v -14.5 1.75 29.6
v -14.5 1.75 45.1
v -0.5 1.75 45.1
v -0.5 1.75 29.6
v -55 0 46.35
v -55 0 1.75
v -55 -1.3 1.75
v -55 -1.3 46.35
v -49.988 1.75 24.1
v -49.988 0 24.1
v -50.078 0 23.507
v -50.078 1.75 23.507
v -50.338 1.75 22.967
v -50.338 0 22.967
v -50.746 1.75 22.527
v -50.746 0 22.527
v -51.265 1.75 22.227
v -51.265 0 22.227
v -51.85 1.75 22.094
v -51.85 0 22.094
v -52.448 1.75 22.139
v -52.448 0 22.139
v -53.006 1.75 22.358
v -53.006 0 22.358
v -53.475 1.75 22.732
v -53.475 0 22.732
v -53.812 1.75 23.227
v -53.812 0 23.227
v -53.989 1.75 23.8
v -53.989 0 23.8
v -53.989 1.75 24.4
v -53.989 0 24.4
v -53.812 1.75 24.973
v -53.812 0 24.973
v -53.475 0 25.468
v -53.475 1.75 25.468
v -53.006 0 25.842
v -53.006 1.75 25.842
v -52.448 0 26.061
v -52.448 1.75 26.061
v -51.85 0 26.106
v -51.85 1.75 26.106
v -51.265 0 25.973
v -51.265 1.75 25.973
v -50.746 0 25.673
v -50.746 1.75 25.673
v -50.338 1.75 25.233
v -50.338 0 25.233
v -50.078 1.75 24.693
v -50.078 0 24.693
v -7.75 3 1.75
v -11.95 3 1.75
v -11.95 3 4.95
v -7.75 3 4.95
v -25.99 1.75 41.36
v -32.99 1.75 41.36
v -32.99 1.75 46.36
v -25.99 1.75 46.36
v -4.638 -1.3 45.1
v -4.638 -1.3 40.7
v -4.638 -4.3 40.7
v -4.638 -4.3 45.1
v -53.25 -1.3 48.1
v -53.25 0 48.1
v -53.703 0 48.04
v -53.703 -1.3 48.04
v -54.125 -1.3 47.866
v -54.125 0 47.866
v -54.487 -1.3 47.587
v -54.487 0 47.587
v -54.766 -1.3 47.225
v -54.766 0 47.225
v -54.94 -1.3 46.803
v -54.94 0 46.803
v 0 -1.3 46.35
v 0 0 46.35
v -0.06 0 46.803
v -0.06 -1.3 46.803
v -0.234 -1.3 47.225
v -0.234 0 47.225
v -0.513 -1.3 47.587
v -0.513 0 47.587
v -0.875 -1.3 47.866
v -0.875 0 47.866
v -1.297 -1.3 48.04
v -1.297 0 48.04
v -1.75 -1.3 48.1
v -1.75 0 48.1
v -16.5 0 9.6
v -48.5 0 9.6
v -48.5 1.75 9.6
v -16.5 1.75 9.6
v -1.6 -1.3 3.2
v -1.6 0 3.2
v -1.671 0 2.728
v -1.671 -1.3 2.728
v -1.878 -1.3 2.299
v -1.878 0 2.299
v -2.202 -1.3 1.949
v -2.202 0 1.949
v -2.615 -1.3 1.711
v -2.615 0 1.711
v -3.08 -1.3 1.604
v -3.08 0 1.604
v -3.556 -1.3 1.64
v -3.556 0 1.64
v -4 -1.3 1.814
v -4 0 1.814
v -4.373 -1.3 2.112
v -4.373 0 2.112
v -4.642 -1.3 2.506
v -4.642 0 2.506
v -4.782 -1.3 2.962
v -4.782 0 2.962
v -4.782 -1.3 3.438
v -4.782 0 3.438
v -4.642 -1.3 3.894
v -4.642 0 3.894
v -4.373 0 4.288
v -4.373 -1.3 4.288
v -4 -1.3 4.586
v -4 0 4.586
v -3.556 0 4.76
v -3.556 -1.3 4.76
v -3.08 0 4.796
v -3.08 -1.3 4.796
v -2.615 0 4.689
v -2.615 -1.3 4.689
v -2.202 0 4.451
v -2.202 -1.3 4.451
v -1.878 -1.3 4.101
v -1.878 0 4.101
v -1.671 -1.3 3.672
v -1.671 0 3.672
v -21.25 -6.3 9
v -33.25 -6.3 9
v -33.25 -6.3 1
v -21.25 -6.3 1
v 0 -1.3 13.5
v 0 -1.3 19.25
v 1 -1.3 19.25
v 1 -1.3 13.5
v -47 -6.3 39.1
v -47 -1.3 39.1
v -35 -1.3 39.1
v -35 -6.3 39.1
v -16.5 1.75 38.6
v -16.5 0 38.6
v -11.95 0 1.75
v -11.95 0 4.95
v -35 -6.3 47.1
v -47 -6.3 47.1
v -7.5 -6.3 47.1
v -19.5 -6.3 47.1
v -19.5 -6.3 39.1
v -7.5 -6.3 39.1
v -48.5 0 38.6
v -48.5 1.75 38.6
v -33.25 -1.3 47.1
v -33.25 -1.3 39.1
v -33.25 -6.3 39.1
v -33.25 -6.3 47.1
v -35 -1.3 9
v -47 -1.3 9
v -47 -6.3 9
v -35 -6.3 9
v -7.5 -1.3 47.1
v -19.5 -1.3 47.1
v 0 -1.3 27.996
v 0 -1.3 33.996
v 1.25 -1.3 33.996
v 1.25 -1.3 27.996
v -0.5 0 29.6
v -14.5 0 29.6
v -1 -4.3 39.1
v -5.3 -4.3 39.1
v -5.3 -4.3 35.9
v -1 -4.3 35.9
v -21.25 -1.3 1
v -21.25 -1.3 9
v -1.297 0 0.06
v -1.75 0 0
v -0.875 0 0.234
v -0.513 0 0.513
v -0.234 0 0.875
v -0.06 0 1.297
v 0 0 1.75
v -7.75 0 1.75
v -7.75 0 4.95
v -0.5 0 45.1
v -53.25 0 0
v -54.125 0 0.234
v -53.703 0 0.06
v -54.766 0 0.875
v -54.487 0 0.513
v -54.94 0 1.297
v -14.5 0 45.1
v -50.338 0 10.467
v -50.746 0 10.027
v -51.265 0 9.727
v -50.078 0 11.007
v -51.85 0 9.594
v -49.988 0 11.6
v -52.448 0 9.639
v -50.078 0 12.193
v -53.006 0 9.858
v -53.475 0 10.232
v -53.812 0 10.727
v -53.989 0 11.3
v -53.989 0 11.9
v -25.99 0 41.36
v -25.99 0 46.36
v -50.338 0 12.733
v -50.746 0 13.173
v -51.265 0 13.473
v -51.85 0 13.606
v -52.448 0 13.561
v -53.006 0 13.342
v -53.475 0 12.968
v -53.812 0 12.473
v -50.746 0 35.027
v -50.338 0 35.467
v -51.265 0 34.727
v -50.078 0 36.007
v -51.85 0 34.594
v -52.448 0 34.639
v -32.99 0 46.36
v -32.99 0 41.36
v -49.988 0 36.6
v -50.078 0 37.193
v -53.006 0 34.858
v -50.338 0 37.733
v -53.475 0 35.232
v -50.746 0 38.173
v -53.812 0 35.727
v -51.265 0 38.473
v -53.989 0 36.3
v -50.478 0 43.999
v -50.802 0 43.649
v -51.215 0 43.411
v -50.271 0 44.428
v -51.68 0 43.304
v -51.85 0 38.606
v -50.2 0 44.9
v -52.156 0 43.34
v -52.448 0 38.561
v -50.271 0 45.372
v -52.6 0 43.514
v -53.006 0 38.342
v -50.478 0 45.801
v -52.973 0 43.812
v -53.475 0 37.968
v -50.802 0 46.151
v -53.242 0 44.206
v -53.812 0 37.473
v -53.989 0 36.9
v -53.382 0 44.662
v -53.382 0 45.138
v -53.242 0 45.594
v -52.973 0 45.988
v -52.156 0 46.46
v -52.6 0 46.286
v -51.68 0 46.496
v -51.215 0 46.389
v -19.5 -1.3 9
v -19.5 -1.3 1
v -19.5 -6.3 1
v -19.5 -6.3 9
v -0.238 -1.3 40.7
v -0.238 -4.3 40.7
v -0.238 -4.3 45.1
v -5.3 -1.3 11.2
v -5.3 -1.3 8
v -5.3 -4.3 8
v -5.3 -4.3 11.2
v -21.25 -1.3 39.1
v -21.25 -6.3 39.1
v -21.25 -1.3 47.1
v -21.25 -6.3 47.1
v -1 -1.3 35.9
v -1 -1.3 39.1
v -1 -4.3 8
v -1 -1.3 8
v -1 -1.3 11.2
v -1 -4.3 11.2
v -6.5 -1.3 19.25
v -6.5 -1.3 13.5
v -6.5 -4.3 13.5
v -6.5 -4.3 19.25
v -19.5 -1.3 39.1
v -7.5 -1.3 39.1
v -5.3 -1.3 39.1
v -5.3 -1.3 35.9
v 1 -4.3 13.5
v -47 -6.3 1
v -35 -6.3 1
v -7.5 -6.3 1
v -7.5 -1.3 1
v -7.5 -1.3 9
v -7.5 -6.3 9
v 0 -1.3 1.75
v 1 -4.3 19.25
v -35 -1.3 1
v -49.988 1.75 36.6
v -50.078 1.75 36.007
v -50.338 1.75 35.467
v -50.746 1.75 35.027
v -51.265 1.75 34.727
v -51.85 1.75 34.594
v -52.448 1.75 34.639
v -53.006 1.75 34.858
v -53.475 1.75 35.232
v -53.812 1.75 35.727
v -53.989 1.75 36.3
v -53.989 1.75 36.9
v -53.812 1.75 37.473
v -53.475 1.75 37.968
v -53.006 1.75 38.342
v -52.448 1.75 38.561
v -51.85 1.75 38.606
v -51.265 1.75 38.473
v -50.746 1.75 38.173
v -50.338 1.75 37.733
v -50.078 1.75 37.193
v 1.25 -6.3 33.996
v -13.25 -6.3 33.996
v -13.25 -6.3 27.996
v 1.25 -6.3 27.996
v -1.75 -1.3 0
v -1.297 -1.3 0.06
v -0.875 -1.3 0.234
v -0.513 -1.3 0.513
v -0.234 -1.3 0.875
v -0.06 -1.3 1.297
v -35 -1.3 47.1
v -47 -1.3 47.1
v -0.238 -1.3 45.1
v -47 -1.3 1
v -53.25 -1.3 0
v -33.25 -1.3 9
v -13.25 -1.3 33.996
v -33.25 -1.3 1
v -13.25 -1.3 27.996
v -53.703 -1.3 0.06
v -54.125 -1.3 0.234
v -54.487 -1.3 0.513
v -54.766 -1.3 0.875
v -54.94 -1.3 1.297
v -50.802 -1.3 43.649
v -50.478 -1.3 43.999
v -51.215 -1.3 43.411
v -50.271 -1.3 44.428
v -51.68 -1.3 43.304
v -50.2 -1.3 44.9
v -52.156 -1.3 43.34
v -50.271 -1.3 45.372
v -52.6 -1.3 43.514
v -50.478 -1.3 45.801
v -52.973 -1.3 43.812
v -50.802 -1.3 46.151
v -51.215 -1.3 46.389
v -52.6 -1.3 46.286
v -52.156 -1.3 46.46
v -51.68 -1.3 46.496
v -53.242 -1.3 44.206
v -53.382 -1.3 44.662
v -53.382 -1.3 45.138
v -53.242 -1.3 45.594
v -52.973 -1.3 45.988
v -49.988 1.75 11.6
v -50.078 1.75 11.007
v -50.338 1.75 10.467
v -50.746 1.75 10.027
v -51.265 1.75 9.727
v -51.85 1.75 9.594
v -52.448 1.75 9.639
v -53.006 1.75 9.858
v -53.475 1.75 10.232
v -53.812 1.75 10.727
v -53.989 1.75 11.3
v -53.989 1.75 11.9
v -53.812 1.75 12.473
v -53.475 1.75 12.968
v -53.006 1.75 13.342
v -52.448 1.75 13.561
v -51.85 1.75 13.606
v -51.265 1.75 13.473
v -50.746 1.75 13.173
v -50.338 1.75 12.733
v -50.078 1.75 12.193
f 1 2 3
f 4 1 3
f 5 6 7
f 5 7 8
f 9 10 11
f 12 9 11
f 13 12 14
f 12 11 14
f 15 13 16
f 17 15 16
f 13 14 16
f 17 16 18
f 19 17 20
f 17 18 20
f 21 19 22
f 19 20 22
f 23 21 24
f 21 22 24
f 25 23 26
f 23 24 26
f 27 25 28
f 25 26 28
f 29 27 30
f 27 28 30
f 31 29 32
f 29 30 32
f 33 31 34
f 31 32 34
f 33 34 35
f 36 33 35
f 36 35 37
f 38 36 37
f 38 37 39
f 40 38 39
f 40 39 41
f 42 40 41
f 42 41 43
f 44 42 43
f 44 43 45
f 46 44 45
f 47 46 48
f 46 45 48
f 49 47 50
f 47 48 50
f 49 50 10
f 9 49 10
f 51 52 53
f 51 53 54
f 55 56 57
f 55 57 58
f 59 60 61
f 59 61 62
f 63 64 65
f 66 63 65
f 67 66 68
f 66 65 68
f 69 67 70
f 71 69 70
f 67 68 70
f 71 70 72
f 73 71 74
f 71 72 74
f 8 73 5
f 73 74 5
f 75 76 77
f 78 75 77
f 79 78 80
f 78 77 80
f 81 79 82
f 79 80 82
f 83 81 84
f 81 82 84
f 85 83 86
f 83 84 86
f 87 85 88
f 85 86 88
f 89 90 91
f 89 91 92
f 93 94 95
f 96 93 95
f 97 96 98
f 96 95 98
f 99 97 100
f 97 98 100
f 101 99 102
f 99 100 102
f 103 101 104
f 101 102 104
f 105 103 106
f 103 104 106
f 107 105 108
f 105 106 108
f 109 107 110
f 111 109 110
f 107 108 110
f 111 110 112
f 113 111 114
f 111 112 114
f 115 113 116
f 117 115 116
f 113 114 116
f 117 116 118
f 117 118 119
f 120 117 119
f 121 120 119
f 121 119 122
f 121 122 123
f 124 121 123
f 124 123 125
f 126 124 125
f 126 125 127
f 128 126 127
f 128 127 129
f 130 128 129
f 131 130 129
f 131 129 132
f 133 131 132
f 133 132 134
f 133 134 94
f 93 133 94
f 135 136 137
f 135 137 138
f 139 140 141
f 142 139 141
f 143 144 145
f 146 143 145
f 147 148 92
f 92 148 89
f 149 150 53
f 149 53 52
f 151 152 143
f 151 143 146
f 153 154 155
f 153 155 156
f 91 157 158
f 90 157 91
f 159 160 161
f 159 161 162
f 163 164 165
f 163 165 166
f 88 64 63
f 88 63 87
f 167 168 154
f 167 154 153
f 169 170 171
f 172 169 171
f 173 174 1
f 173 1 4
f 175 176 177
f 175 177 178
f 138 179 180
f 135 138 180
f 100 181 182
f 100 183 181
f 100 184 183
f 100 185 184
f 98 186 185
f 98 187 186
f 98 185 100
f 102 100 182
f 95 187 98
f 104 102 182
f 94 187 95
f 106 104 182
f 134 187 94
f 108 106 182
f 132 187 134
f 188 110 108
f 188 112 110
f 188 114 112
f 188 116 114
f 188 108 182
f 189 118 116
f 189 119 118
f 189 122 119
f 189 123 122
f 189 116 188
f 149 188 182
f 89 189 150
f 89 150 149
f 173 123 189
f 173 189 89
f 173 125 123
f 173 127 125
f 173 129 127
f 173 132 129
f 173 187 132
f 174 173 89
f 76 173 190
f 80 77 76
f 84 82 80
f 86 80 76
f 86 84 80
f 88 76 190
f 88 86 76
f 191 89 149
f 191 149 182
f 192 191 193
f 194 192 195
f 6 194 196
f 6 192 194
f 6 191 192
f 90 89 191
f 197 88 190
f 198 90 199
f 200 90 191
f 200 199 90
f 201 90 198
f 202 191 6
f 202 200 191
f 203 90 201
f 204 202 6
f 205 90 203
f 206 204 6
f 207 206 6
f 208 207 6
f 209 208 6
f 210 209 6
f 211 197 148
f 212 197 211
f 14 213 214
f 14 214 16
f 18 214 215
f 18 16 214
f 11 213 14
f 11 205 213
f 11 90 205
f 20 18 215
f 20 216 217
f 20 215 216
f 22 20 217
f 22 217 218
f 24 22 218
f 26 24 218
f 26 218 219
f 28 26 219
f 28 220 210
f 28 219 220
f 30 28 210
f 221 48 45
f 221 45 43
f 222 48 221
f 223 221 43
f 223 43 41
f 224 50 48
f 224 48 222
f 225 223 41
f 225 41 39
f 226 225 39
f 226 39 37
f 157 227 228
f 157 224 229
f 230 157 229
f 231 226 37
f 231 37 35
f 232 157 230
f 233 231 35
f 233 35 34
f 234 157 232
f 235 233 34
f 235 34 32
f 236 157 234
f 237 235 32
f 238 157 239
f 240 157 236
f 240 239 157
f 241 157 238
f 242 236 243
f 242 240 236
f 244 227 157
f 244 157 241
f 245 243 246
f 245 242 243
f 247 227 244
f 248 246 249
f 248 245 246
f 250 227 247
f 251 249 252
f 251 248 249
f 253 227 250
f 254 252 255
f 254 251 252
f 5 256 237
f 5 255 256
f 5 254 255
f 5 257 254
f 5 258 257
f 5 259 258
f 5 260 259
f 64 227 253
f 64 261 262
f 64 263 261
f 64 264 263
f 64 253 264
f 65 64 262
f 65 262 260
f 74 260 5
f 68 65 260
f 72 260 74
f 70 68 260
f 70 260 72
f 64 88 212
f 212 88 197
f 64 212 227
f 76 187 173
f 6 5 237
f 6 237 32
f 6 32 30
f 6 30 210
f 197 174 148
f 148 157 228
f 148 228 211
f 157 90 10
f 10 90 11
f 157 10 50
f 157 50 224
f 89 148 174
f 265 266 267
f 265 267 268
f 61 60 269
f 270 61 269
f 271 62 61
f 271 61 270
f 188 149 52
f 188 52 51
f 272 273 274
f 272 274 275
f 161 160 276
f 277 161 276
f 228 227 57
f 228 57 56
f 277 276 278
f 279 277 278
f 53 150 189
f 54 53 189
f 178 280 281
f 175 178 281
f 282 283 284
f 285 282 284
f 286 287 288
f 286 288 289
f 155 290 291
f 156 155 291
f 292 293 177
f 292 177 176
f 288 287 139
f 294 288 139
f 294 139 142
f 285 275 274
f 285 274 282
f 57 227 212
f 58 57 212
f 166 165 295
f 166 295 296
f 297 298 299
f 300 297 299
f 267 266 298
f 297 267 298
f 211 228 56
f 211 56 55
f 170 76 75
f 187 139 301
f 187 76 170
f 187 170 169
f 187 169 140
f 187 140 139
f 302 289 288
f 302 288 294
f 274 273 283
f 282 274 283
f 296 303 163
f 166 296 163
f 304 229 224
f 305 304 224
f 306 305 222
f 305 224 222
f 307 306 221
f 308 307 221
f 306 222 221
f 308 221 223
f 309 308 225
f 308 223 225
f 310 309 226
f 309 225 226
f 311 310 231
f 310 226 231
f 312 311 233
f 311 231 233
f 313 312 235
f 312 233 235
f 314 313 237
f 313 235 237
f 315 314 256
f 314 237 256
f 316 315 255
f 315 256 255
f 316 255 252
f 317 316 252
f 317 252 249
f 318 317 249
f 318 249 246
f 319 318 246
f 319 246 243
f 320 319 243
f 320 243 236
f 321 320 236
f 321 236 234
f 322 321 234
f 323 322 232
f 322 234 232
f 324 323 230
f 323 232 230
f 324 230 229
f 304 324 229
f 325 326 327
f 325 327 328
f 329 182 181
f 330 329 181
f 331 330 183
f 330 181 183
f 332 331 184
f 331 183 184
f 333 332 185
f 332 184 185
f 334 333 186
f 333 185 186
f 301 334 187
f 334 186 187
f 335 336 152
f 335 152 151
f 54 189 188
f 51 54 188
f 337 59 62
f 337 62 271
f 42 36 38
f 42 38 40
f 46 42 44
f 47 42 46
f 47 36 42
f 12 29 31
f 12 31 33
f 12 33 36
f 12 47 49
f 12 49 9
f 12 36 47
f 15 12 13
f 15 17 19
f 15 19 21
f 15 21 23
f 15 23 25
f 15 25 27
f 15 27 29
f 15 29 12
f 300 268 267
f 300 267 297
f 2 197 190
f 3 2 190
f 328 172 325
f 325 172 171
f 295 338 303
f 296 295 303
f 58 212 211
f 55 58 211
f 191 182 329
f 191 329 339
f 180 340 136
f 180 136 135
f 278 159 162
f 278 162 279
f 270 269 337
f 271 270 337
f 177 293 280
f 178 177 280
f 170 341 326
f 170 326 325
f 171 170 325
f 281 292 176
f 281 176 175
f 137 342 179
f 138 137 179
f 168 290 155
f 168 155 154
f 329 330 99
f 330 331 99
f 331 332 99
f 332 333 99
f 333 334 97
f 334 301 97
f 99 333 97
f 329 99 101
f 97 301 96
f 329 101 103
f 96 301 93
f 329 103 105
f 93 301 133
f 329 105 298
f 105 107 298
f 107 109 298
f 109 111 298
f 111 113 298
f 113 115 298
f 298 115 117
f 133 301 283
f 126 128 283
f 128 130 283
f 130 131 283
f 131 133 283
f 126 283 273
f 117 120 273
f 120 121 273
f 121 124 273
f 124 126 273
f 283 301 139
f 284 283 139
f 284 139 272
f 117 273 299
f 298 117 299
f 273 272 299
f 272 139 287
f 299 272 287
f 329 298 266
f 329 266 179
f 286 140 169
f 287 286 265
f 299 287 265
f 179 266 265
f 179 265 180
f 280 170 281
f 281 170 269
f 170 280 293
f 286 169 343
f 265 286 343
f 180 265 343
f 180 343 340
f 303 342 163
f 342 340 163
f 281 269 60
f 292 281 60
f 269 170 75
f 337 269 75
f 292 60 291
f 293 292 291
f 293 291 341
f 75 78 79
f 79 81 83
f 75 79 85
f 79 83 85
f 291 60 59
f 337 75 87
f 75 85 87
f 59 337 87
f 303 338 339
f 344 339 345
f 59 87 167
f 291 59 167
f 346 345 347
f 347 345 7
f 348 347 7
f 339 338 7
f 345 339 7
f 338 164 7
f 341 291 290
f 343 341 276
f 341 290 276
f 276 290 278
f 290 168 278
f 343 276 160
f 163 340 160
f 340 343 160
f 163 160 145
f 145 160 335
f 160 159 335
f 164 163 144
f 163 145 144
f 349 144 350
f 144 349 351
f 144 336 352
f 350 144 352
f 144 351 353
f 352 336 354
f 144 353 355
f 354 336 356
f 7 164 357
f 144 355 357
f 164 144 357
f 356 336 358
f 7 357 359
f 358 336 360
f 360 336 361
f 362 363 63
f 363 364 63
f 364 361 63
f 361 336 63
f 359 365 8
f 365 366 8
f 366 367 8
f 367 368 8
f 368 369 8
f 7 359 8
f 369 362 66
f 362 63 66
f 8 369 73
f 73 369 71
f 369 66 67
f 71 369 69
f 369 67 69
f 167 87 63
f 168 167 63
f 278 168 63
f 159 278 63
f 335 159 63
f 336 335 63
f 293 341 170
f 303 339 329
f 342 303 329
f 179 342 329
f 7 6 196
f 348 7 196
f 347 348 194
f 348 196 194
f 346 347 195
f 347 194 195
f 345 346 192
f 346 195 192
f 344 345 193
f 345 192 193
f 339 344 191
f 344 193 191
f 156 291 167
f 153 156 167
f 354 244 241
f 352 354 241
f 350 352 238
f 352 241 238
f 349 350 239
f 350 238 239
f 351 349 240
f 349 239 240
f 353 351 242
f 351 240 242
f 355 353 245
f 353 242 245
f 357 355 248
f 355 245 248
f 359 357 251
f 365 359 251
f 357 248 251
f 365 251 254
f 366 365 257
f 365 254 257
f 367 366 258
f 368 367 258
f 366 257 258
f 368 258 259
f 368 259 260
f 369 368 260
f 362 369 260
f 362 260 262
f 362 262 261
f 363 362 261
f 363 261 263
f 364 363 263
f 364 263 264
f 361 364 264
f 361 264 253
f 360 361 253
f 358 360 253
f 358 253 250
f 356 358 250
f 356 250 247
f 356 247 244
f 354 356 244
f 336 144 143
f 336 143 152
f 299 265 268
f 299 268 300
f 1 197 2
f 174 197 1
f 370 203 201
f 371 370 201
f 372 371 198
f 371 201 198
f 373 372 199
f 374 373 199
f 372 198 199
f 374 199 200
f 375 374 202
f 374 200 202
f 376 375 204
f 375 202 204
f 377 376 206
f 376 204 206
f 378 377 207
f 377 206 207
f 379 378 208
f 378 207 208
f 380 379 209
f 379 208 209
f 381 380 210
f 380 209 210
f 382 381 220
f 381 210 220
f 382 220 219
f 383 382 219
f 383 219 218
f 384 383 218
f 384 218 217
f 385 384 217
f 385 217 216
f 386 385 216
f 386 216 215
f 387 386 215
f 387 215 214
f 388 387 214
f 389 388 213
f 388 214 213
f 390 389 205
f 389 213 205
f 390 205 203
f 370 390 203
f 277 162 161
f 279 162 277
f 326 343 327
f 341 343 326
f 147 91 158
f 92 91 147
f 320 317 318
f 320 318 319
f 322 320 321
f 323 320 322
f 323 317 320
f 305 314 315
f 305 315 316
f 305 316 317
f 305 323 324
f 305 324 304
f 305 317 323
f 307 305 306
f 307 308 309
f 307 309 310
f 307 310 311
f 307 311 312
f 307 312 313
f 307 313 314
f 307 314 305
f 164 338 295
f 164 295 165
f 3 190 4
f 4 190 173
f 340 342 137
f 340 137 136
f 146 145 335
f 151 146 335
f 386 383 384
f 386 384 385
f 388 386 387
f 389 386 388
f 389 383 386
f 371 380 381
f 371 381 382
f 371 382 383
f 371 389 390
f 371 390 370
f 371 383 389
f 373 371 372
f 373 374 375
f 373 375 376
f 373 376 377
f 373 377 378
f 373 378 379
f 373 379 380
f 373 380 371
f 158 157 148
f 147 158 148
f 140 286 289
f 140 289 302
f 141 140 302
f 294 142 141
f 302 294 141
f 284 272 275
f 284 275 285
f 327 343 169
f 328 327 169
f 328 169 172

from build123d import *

# Parameters (mm, degrees)
PAD_DEPTH     = 1.3
SKETCH001_R   = 2.011692
SKETCH001_W   = 32
SKETCH001_H   = 29
SKETCH001_W_2 = 7
SKETCH001_H_2 = 5
SKETCH001_W_3 = 14
SKETCH001_H_3 = 15.5
PAD001_DEPTH  = 1.75
SKETCH002_W   = 12
SKETCH002_H   = 8
SKETCH002_W_2 = 14.5
SKETCH002_H_2 = 6
PAD002_DEPTH  = 5
SKETCH003_W   = 4.4
SKETCH003_H   = 4.4
SKETCH003_W_2 = 4.3
SKETCH003_H_2 = 3.2
SKETCH003_W_3 = 7.5
SKETCH003_H_3 = 5.75
PAD003_DEPTH  = 3
SKETCH004_W   = 4.2
SKETCH004_H   = 3.2
PAD004_DEPTH  = 3
SKETCH005_R   = 1.6
POCKET_DEPTH  = 6.301


with BuildPart() as part:
    # Sketch → Pad (new body)
    with BuildSketch(Plane.XZ):
        with BuildLine():
            Line((-53.25, 48.1), (-1.75, 48.1))
            ThreePointArc((0, 46.35), (-0.512563, 47.587437), (-1.75, 48.1))
            Line((0, 46.35), (0, 1.75))
            ThreePointArc((-1.75, 0), (-0.512563, 0.512563), (0, 1.75))
            Line((-1.75, 0), (-53.25, 0))
            ThreePointArc((-55, 1.75), (-54.487437, 0.512563), (-53.25, 0))
            Line((-55, 1.75), (-55, 46.35))
            ThreePointArc((-53.25, 48.1), (-54.487437, 47.587437), (-55, 46.35))
        make_face()
    extrude(amount=PAD_DEPTH)

    # Sketch001 (on Face9 of Pad) → Pad001 (join)
    with BuildSketch(Plane(origin=(0, 0, 0), x_dir=(1, 0, 0), z_dir=(0, 1, 0))):
        with Locations((-52, -24.1)):
            Circle(SKETCH001_R)
        with Locations((-52, -11.6)):
            Circle(SKETCH001_R)
        with Locations((-52, -36.6)):
            Circle(SKETCH001_R)
        with Locations((-32.5, -24.1)):
            Rectangle(SKETCH001_W, SKETCH001_H)
        with Locations((-29.49, -43.86)):
            Rectangle(SKETCH001_W_2, SKETCH001_H_2)
        with Locations((-7.5, -37.35)):
            Rectangle(SKETCH001_W_3, SKETCH001_H_3)
    extrude(amount=PAD001_DEPTH)

    # Sketch002 (on Face5 of Pad001) → Pad002 (join)
    with BuildSketch(Plane.XZ.offset(1.3)):
        with Locations((-41, 43.1)):
            Rectangle(SKETCH002_W, SKETCH002_H)
        with Locations((-27.25, 43.1)):
            Rectangle(SKETCH002_W, SKETCH002_H)
        with Locations((-13.5, 43.1)):
            Rectangle(SKETCH002_W, SKETCH002_H)
        with Locations((-41, 5)):
            Rectangle(SKETCH002_W, SKETCH002_H)
        with Locations((-27.25, 5)):
            Rectangle(SKETCH002_W, SKETCH002_H)
        with Locations((-13.5, 5)):
            Rectangle(SKETCH002_W, SKETCH002_H)
        with Locations((-6, 30.995757)):
            Rectangle(SKETCH002_W_2, SKETCH002_H_2)
    extrude(amount=PAD002_DEPTH)

    # Sketch003 (on Face5 of Pad002) → Pad003 (join)
    with BuildSketch(Plane.XZ.offset(1.3)):
        with Locations((-2.437883, 42.9)):
            Rectangle(SKETCH003_W, SKETCH003_H)
        with Locations((-3.15, 37.5)):
            Rectangle(SKETCH003_W_2, SKETCH003_H_2)
        with Locations((-2.75, 16.375)):
            Rectangle(SKETCH003_W_3, SKETCH003_H_3)
        with Locations((-3.15, 9.6)):
            Rectangle(SKETCH003_W_2, SKETCH003_H_2)
    extrude(amount=PAD003_DEPTH)

    # Sketch004 (on Face4 of Pad003) → Pad004 (join)
    with BuildSketch(Plane(origin=(0, 0, 0), x_dir=(1, 0, 0), z_dir=(0, 1, 0))):
        with Locations((-9.85, -3.35)):
            Rectangle(SKETCH004_W, SKETCH004_H)
    extrude(amount=PAD004_DEPTH)

    # Sketch005 (on Face4 of Pad004) → Pocket (cut, through all)
    with BuildSketch(Plane(origin=(0, 0, 0), x_dir=(1, 0, 0), z_dir=(0, 1, 0))):
        with Locations((-3.2, -3.2)):
            Circle(SKETCH005_R)
        with Locations((-51.8, -44.9)):
            Circle(SKETCH005_R)
    extrude(amount=-POCKET_DEPTH, mode=Mode.SUBTRACT)


solid = part.part
